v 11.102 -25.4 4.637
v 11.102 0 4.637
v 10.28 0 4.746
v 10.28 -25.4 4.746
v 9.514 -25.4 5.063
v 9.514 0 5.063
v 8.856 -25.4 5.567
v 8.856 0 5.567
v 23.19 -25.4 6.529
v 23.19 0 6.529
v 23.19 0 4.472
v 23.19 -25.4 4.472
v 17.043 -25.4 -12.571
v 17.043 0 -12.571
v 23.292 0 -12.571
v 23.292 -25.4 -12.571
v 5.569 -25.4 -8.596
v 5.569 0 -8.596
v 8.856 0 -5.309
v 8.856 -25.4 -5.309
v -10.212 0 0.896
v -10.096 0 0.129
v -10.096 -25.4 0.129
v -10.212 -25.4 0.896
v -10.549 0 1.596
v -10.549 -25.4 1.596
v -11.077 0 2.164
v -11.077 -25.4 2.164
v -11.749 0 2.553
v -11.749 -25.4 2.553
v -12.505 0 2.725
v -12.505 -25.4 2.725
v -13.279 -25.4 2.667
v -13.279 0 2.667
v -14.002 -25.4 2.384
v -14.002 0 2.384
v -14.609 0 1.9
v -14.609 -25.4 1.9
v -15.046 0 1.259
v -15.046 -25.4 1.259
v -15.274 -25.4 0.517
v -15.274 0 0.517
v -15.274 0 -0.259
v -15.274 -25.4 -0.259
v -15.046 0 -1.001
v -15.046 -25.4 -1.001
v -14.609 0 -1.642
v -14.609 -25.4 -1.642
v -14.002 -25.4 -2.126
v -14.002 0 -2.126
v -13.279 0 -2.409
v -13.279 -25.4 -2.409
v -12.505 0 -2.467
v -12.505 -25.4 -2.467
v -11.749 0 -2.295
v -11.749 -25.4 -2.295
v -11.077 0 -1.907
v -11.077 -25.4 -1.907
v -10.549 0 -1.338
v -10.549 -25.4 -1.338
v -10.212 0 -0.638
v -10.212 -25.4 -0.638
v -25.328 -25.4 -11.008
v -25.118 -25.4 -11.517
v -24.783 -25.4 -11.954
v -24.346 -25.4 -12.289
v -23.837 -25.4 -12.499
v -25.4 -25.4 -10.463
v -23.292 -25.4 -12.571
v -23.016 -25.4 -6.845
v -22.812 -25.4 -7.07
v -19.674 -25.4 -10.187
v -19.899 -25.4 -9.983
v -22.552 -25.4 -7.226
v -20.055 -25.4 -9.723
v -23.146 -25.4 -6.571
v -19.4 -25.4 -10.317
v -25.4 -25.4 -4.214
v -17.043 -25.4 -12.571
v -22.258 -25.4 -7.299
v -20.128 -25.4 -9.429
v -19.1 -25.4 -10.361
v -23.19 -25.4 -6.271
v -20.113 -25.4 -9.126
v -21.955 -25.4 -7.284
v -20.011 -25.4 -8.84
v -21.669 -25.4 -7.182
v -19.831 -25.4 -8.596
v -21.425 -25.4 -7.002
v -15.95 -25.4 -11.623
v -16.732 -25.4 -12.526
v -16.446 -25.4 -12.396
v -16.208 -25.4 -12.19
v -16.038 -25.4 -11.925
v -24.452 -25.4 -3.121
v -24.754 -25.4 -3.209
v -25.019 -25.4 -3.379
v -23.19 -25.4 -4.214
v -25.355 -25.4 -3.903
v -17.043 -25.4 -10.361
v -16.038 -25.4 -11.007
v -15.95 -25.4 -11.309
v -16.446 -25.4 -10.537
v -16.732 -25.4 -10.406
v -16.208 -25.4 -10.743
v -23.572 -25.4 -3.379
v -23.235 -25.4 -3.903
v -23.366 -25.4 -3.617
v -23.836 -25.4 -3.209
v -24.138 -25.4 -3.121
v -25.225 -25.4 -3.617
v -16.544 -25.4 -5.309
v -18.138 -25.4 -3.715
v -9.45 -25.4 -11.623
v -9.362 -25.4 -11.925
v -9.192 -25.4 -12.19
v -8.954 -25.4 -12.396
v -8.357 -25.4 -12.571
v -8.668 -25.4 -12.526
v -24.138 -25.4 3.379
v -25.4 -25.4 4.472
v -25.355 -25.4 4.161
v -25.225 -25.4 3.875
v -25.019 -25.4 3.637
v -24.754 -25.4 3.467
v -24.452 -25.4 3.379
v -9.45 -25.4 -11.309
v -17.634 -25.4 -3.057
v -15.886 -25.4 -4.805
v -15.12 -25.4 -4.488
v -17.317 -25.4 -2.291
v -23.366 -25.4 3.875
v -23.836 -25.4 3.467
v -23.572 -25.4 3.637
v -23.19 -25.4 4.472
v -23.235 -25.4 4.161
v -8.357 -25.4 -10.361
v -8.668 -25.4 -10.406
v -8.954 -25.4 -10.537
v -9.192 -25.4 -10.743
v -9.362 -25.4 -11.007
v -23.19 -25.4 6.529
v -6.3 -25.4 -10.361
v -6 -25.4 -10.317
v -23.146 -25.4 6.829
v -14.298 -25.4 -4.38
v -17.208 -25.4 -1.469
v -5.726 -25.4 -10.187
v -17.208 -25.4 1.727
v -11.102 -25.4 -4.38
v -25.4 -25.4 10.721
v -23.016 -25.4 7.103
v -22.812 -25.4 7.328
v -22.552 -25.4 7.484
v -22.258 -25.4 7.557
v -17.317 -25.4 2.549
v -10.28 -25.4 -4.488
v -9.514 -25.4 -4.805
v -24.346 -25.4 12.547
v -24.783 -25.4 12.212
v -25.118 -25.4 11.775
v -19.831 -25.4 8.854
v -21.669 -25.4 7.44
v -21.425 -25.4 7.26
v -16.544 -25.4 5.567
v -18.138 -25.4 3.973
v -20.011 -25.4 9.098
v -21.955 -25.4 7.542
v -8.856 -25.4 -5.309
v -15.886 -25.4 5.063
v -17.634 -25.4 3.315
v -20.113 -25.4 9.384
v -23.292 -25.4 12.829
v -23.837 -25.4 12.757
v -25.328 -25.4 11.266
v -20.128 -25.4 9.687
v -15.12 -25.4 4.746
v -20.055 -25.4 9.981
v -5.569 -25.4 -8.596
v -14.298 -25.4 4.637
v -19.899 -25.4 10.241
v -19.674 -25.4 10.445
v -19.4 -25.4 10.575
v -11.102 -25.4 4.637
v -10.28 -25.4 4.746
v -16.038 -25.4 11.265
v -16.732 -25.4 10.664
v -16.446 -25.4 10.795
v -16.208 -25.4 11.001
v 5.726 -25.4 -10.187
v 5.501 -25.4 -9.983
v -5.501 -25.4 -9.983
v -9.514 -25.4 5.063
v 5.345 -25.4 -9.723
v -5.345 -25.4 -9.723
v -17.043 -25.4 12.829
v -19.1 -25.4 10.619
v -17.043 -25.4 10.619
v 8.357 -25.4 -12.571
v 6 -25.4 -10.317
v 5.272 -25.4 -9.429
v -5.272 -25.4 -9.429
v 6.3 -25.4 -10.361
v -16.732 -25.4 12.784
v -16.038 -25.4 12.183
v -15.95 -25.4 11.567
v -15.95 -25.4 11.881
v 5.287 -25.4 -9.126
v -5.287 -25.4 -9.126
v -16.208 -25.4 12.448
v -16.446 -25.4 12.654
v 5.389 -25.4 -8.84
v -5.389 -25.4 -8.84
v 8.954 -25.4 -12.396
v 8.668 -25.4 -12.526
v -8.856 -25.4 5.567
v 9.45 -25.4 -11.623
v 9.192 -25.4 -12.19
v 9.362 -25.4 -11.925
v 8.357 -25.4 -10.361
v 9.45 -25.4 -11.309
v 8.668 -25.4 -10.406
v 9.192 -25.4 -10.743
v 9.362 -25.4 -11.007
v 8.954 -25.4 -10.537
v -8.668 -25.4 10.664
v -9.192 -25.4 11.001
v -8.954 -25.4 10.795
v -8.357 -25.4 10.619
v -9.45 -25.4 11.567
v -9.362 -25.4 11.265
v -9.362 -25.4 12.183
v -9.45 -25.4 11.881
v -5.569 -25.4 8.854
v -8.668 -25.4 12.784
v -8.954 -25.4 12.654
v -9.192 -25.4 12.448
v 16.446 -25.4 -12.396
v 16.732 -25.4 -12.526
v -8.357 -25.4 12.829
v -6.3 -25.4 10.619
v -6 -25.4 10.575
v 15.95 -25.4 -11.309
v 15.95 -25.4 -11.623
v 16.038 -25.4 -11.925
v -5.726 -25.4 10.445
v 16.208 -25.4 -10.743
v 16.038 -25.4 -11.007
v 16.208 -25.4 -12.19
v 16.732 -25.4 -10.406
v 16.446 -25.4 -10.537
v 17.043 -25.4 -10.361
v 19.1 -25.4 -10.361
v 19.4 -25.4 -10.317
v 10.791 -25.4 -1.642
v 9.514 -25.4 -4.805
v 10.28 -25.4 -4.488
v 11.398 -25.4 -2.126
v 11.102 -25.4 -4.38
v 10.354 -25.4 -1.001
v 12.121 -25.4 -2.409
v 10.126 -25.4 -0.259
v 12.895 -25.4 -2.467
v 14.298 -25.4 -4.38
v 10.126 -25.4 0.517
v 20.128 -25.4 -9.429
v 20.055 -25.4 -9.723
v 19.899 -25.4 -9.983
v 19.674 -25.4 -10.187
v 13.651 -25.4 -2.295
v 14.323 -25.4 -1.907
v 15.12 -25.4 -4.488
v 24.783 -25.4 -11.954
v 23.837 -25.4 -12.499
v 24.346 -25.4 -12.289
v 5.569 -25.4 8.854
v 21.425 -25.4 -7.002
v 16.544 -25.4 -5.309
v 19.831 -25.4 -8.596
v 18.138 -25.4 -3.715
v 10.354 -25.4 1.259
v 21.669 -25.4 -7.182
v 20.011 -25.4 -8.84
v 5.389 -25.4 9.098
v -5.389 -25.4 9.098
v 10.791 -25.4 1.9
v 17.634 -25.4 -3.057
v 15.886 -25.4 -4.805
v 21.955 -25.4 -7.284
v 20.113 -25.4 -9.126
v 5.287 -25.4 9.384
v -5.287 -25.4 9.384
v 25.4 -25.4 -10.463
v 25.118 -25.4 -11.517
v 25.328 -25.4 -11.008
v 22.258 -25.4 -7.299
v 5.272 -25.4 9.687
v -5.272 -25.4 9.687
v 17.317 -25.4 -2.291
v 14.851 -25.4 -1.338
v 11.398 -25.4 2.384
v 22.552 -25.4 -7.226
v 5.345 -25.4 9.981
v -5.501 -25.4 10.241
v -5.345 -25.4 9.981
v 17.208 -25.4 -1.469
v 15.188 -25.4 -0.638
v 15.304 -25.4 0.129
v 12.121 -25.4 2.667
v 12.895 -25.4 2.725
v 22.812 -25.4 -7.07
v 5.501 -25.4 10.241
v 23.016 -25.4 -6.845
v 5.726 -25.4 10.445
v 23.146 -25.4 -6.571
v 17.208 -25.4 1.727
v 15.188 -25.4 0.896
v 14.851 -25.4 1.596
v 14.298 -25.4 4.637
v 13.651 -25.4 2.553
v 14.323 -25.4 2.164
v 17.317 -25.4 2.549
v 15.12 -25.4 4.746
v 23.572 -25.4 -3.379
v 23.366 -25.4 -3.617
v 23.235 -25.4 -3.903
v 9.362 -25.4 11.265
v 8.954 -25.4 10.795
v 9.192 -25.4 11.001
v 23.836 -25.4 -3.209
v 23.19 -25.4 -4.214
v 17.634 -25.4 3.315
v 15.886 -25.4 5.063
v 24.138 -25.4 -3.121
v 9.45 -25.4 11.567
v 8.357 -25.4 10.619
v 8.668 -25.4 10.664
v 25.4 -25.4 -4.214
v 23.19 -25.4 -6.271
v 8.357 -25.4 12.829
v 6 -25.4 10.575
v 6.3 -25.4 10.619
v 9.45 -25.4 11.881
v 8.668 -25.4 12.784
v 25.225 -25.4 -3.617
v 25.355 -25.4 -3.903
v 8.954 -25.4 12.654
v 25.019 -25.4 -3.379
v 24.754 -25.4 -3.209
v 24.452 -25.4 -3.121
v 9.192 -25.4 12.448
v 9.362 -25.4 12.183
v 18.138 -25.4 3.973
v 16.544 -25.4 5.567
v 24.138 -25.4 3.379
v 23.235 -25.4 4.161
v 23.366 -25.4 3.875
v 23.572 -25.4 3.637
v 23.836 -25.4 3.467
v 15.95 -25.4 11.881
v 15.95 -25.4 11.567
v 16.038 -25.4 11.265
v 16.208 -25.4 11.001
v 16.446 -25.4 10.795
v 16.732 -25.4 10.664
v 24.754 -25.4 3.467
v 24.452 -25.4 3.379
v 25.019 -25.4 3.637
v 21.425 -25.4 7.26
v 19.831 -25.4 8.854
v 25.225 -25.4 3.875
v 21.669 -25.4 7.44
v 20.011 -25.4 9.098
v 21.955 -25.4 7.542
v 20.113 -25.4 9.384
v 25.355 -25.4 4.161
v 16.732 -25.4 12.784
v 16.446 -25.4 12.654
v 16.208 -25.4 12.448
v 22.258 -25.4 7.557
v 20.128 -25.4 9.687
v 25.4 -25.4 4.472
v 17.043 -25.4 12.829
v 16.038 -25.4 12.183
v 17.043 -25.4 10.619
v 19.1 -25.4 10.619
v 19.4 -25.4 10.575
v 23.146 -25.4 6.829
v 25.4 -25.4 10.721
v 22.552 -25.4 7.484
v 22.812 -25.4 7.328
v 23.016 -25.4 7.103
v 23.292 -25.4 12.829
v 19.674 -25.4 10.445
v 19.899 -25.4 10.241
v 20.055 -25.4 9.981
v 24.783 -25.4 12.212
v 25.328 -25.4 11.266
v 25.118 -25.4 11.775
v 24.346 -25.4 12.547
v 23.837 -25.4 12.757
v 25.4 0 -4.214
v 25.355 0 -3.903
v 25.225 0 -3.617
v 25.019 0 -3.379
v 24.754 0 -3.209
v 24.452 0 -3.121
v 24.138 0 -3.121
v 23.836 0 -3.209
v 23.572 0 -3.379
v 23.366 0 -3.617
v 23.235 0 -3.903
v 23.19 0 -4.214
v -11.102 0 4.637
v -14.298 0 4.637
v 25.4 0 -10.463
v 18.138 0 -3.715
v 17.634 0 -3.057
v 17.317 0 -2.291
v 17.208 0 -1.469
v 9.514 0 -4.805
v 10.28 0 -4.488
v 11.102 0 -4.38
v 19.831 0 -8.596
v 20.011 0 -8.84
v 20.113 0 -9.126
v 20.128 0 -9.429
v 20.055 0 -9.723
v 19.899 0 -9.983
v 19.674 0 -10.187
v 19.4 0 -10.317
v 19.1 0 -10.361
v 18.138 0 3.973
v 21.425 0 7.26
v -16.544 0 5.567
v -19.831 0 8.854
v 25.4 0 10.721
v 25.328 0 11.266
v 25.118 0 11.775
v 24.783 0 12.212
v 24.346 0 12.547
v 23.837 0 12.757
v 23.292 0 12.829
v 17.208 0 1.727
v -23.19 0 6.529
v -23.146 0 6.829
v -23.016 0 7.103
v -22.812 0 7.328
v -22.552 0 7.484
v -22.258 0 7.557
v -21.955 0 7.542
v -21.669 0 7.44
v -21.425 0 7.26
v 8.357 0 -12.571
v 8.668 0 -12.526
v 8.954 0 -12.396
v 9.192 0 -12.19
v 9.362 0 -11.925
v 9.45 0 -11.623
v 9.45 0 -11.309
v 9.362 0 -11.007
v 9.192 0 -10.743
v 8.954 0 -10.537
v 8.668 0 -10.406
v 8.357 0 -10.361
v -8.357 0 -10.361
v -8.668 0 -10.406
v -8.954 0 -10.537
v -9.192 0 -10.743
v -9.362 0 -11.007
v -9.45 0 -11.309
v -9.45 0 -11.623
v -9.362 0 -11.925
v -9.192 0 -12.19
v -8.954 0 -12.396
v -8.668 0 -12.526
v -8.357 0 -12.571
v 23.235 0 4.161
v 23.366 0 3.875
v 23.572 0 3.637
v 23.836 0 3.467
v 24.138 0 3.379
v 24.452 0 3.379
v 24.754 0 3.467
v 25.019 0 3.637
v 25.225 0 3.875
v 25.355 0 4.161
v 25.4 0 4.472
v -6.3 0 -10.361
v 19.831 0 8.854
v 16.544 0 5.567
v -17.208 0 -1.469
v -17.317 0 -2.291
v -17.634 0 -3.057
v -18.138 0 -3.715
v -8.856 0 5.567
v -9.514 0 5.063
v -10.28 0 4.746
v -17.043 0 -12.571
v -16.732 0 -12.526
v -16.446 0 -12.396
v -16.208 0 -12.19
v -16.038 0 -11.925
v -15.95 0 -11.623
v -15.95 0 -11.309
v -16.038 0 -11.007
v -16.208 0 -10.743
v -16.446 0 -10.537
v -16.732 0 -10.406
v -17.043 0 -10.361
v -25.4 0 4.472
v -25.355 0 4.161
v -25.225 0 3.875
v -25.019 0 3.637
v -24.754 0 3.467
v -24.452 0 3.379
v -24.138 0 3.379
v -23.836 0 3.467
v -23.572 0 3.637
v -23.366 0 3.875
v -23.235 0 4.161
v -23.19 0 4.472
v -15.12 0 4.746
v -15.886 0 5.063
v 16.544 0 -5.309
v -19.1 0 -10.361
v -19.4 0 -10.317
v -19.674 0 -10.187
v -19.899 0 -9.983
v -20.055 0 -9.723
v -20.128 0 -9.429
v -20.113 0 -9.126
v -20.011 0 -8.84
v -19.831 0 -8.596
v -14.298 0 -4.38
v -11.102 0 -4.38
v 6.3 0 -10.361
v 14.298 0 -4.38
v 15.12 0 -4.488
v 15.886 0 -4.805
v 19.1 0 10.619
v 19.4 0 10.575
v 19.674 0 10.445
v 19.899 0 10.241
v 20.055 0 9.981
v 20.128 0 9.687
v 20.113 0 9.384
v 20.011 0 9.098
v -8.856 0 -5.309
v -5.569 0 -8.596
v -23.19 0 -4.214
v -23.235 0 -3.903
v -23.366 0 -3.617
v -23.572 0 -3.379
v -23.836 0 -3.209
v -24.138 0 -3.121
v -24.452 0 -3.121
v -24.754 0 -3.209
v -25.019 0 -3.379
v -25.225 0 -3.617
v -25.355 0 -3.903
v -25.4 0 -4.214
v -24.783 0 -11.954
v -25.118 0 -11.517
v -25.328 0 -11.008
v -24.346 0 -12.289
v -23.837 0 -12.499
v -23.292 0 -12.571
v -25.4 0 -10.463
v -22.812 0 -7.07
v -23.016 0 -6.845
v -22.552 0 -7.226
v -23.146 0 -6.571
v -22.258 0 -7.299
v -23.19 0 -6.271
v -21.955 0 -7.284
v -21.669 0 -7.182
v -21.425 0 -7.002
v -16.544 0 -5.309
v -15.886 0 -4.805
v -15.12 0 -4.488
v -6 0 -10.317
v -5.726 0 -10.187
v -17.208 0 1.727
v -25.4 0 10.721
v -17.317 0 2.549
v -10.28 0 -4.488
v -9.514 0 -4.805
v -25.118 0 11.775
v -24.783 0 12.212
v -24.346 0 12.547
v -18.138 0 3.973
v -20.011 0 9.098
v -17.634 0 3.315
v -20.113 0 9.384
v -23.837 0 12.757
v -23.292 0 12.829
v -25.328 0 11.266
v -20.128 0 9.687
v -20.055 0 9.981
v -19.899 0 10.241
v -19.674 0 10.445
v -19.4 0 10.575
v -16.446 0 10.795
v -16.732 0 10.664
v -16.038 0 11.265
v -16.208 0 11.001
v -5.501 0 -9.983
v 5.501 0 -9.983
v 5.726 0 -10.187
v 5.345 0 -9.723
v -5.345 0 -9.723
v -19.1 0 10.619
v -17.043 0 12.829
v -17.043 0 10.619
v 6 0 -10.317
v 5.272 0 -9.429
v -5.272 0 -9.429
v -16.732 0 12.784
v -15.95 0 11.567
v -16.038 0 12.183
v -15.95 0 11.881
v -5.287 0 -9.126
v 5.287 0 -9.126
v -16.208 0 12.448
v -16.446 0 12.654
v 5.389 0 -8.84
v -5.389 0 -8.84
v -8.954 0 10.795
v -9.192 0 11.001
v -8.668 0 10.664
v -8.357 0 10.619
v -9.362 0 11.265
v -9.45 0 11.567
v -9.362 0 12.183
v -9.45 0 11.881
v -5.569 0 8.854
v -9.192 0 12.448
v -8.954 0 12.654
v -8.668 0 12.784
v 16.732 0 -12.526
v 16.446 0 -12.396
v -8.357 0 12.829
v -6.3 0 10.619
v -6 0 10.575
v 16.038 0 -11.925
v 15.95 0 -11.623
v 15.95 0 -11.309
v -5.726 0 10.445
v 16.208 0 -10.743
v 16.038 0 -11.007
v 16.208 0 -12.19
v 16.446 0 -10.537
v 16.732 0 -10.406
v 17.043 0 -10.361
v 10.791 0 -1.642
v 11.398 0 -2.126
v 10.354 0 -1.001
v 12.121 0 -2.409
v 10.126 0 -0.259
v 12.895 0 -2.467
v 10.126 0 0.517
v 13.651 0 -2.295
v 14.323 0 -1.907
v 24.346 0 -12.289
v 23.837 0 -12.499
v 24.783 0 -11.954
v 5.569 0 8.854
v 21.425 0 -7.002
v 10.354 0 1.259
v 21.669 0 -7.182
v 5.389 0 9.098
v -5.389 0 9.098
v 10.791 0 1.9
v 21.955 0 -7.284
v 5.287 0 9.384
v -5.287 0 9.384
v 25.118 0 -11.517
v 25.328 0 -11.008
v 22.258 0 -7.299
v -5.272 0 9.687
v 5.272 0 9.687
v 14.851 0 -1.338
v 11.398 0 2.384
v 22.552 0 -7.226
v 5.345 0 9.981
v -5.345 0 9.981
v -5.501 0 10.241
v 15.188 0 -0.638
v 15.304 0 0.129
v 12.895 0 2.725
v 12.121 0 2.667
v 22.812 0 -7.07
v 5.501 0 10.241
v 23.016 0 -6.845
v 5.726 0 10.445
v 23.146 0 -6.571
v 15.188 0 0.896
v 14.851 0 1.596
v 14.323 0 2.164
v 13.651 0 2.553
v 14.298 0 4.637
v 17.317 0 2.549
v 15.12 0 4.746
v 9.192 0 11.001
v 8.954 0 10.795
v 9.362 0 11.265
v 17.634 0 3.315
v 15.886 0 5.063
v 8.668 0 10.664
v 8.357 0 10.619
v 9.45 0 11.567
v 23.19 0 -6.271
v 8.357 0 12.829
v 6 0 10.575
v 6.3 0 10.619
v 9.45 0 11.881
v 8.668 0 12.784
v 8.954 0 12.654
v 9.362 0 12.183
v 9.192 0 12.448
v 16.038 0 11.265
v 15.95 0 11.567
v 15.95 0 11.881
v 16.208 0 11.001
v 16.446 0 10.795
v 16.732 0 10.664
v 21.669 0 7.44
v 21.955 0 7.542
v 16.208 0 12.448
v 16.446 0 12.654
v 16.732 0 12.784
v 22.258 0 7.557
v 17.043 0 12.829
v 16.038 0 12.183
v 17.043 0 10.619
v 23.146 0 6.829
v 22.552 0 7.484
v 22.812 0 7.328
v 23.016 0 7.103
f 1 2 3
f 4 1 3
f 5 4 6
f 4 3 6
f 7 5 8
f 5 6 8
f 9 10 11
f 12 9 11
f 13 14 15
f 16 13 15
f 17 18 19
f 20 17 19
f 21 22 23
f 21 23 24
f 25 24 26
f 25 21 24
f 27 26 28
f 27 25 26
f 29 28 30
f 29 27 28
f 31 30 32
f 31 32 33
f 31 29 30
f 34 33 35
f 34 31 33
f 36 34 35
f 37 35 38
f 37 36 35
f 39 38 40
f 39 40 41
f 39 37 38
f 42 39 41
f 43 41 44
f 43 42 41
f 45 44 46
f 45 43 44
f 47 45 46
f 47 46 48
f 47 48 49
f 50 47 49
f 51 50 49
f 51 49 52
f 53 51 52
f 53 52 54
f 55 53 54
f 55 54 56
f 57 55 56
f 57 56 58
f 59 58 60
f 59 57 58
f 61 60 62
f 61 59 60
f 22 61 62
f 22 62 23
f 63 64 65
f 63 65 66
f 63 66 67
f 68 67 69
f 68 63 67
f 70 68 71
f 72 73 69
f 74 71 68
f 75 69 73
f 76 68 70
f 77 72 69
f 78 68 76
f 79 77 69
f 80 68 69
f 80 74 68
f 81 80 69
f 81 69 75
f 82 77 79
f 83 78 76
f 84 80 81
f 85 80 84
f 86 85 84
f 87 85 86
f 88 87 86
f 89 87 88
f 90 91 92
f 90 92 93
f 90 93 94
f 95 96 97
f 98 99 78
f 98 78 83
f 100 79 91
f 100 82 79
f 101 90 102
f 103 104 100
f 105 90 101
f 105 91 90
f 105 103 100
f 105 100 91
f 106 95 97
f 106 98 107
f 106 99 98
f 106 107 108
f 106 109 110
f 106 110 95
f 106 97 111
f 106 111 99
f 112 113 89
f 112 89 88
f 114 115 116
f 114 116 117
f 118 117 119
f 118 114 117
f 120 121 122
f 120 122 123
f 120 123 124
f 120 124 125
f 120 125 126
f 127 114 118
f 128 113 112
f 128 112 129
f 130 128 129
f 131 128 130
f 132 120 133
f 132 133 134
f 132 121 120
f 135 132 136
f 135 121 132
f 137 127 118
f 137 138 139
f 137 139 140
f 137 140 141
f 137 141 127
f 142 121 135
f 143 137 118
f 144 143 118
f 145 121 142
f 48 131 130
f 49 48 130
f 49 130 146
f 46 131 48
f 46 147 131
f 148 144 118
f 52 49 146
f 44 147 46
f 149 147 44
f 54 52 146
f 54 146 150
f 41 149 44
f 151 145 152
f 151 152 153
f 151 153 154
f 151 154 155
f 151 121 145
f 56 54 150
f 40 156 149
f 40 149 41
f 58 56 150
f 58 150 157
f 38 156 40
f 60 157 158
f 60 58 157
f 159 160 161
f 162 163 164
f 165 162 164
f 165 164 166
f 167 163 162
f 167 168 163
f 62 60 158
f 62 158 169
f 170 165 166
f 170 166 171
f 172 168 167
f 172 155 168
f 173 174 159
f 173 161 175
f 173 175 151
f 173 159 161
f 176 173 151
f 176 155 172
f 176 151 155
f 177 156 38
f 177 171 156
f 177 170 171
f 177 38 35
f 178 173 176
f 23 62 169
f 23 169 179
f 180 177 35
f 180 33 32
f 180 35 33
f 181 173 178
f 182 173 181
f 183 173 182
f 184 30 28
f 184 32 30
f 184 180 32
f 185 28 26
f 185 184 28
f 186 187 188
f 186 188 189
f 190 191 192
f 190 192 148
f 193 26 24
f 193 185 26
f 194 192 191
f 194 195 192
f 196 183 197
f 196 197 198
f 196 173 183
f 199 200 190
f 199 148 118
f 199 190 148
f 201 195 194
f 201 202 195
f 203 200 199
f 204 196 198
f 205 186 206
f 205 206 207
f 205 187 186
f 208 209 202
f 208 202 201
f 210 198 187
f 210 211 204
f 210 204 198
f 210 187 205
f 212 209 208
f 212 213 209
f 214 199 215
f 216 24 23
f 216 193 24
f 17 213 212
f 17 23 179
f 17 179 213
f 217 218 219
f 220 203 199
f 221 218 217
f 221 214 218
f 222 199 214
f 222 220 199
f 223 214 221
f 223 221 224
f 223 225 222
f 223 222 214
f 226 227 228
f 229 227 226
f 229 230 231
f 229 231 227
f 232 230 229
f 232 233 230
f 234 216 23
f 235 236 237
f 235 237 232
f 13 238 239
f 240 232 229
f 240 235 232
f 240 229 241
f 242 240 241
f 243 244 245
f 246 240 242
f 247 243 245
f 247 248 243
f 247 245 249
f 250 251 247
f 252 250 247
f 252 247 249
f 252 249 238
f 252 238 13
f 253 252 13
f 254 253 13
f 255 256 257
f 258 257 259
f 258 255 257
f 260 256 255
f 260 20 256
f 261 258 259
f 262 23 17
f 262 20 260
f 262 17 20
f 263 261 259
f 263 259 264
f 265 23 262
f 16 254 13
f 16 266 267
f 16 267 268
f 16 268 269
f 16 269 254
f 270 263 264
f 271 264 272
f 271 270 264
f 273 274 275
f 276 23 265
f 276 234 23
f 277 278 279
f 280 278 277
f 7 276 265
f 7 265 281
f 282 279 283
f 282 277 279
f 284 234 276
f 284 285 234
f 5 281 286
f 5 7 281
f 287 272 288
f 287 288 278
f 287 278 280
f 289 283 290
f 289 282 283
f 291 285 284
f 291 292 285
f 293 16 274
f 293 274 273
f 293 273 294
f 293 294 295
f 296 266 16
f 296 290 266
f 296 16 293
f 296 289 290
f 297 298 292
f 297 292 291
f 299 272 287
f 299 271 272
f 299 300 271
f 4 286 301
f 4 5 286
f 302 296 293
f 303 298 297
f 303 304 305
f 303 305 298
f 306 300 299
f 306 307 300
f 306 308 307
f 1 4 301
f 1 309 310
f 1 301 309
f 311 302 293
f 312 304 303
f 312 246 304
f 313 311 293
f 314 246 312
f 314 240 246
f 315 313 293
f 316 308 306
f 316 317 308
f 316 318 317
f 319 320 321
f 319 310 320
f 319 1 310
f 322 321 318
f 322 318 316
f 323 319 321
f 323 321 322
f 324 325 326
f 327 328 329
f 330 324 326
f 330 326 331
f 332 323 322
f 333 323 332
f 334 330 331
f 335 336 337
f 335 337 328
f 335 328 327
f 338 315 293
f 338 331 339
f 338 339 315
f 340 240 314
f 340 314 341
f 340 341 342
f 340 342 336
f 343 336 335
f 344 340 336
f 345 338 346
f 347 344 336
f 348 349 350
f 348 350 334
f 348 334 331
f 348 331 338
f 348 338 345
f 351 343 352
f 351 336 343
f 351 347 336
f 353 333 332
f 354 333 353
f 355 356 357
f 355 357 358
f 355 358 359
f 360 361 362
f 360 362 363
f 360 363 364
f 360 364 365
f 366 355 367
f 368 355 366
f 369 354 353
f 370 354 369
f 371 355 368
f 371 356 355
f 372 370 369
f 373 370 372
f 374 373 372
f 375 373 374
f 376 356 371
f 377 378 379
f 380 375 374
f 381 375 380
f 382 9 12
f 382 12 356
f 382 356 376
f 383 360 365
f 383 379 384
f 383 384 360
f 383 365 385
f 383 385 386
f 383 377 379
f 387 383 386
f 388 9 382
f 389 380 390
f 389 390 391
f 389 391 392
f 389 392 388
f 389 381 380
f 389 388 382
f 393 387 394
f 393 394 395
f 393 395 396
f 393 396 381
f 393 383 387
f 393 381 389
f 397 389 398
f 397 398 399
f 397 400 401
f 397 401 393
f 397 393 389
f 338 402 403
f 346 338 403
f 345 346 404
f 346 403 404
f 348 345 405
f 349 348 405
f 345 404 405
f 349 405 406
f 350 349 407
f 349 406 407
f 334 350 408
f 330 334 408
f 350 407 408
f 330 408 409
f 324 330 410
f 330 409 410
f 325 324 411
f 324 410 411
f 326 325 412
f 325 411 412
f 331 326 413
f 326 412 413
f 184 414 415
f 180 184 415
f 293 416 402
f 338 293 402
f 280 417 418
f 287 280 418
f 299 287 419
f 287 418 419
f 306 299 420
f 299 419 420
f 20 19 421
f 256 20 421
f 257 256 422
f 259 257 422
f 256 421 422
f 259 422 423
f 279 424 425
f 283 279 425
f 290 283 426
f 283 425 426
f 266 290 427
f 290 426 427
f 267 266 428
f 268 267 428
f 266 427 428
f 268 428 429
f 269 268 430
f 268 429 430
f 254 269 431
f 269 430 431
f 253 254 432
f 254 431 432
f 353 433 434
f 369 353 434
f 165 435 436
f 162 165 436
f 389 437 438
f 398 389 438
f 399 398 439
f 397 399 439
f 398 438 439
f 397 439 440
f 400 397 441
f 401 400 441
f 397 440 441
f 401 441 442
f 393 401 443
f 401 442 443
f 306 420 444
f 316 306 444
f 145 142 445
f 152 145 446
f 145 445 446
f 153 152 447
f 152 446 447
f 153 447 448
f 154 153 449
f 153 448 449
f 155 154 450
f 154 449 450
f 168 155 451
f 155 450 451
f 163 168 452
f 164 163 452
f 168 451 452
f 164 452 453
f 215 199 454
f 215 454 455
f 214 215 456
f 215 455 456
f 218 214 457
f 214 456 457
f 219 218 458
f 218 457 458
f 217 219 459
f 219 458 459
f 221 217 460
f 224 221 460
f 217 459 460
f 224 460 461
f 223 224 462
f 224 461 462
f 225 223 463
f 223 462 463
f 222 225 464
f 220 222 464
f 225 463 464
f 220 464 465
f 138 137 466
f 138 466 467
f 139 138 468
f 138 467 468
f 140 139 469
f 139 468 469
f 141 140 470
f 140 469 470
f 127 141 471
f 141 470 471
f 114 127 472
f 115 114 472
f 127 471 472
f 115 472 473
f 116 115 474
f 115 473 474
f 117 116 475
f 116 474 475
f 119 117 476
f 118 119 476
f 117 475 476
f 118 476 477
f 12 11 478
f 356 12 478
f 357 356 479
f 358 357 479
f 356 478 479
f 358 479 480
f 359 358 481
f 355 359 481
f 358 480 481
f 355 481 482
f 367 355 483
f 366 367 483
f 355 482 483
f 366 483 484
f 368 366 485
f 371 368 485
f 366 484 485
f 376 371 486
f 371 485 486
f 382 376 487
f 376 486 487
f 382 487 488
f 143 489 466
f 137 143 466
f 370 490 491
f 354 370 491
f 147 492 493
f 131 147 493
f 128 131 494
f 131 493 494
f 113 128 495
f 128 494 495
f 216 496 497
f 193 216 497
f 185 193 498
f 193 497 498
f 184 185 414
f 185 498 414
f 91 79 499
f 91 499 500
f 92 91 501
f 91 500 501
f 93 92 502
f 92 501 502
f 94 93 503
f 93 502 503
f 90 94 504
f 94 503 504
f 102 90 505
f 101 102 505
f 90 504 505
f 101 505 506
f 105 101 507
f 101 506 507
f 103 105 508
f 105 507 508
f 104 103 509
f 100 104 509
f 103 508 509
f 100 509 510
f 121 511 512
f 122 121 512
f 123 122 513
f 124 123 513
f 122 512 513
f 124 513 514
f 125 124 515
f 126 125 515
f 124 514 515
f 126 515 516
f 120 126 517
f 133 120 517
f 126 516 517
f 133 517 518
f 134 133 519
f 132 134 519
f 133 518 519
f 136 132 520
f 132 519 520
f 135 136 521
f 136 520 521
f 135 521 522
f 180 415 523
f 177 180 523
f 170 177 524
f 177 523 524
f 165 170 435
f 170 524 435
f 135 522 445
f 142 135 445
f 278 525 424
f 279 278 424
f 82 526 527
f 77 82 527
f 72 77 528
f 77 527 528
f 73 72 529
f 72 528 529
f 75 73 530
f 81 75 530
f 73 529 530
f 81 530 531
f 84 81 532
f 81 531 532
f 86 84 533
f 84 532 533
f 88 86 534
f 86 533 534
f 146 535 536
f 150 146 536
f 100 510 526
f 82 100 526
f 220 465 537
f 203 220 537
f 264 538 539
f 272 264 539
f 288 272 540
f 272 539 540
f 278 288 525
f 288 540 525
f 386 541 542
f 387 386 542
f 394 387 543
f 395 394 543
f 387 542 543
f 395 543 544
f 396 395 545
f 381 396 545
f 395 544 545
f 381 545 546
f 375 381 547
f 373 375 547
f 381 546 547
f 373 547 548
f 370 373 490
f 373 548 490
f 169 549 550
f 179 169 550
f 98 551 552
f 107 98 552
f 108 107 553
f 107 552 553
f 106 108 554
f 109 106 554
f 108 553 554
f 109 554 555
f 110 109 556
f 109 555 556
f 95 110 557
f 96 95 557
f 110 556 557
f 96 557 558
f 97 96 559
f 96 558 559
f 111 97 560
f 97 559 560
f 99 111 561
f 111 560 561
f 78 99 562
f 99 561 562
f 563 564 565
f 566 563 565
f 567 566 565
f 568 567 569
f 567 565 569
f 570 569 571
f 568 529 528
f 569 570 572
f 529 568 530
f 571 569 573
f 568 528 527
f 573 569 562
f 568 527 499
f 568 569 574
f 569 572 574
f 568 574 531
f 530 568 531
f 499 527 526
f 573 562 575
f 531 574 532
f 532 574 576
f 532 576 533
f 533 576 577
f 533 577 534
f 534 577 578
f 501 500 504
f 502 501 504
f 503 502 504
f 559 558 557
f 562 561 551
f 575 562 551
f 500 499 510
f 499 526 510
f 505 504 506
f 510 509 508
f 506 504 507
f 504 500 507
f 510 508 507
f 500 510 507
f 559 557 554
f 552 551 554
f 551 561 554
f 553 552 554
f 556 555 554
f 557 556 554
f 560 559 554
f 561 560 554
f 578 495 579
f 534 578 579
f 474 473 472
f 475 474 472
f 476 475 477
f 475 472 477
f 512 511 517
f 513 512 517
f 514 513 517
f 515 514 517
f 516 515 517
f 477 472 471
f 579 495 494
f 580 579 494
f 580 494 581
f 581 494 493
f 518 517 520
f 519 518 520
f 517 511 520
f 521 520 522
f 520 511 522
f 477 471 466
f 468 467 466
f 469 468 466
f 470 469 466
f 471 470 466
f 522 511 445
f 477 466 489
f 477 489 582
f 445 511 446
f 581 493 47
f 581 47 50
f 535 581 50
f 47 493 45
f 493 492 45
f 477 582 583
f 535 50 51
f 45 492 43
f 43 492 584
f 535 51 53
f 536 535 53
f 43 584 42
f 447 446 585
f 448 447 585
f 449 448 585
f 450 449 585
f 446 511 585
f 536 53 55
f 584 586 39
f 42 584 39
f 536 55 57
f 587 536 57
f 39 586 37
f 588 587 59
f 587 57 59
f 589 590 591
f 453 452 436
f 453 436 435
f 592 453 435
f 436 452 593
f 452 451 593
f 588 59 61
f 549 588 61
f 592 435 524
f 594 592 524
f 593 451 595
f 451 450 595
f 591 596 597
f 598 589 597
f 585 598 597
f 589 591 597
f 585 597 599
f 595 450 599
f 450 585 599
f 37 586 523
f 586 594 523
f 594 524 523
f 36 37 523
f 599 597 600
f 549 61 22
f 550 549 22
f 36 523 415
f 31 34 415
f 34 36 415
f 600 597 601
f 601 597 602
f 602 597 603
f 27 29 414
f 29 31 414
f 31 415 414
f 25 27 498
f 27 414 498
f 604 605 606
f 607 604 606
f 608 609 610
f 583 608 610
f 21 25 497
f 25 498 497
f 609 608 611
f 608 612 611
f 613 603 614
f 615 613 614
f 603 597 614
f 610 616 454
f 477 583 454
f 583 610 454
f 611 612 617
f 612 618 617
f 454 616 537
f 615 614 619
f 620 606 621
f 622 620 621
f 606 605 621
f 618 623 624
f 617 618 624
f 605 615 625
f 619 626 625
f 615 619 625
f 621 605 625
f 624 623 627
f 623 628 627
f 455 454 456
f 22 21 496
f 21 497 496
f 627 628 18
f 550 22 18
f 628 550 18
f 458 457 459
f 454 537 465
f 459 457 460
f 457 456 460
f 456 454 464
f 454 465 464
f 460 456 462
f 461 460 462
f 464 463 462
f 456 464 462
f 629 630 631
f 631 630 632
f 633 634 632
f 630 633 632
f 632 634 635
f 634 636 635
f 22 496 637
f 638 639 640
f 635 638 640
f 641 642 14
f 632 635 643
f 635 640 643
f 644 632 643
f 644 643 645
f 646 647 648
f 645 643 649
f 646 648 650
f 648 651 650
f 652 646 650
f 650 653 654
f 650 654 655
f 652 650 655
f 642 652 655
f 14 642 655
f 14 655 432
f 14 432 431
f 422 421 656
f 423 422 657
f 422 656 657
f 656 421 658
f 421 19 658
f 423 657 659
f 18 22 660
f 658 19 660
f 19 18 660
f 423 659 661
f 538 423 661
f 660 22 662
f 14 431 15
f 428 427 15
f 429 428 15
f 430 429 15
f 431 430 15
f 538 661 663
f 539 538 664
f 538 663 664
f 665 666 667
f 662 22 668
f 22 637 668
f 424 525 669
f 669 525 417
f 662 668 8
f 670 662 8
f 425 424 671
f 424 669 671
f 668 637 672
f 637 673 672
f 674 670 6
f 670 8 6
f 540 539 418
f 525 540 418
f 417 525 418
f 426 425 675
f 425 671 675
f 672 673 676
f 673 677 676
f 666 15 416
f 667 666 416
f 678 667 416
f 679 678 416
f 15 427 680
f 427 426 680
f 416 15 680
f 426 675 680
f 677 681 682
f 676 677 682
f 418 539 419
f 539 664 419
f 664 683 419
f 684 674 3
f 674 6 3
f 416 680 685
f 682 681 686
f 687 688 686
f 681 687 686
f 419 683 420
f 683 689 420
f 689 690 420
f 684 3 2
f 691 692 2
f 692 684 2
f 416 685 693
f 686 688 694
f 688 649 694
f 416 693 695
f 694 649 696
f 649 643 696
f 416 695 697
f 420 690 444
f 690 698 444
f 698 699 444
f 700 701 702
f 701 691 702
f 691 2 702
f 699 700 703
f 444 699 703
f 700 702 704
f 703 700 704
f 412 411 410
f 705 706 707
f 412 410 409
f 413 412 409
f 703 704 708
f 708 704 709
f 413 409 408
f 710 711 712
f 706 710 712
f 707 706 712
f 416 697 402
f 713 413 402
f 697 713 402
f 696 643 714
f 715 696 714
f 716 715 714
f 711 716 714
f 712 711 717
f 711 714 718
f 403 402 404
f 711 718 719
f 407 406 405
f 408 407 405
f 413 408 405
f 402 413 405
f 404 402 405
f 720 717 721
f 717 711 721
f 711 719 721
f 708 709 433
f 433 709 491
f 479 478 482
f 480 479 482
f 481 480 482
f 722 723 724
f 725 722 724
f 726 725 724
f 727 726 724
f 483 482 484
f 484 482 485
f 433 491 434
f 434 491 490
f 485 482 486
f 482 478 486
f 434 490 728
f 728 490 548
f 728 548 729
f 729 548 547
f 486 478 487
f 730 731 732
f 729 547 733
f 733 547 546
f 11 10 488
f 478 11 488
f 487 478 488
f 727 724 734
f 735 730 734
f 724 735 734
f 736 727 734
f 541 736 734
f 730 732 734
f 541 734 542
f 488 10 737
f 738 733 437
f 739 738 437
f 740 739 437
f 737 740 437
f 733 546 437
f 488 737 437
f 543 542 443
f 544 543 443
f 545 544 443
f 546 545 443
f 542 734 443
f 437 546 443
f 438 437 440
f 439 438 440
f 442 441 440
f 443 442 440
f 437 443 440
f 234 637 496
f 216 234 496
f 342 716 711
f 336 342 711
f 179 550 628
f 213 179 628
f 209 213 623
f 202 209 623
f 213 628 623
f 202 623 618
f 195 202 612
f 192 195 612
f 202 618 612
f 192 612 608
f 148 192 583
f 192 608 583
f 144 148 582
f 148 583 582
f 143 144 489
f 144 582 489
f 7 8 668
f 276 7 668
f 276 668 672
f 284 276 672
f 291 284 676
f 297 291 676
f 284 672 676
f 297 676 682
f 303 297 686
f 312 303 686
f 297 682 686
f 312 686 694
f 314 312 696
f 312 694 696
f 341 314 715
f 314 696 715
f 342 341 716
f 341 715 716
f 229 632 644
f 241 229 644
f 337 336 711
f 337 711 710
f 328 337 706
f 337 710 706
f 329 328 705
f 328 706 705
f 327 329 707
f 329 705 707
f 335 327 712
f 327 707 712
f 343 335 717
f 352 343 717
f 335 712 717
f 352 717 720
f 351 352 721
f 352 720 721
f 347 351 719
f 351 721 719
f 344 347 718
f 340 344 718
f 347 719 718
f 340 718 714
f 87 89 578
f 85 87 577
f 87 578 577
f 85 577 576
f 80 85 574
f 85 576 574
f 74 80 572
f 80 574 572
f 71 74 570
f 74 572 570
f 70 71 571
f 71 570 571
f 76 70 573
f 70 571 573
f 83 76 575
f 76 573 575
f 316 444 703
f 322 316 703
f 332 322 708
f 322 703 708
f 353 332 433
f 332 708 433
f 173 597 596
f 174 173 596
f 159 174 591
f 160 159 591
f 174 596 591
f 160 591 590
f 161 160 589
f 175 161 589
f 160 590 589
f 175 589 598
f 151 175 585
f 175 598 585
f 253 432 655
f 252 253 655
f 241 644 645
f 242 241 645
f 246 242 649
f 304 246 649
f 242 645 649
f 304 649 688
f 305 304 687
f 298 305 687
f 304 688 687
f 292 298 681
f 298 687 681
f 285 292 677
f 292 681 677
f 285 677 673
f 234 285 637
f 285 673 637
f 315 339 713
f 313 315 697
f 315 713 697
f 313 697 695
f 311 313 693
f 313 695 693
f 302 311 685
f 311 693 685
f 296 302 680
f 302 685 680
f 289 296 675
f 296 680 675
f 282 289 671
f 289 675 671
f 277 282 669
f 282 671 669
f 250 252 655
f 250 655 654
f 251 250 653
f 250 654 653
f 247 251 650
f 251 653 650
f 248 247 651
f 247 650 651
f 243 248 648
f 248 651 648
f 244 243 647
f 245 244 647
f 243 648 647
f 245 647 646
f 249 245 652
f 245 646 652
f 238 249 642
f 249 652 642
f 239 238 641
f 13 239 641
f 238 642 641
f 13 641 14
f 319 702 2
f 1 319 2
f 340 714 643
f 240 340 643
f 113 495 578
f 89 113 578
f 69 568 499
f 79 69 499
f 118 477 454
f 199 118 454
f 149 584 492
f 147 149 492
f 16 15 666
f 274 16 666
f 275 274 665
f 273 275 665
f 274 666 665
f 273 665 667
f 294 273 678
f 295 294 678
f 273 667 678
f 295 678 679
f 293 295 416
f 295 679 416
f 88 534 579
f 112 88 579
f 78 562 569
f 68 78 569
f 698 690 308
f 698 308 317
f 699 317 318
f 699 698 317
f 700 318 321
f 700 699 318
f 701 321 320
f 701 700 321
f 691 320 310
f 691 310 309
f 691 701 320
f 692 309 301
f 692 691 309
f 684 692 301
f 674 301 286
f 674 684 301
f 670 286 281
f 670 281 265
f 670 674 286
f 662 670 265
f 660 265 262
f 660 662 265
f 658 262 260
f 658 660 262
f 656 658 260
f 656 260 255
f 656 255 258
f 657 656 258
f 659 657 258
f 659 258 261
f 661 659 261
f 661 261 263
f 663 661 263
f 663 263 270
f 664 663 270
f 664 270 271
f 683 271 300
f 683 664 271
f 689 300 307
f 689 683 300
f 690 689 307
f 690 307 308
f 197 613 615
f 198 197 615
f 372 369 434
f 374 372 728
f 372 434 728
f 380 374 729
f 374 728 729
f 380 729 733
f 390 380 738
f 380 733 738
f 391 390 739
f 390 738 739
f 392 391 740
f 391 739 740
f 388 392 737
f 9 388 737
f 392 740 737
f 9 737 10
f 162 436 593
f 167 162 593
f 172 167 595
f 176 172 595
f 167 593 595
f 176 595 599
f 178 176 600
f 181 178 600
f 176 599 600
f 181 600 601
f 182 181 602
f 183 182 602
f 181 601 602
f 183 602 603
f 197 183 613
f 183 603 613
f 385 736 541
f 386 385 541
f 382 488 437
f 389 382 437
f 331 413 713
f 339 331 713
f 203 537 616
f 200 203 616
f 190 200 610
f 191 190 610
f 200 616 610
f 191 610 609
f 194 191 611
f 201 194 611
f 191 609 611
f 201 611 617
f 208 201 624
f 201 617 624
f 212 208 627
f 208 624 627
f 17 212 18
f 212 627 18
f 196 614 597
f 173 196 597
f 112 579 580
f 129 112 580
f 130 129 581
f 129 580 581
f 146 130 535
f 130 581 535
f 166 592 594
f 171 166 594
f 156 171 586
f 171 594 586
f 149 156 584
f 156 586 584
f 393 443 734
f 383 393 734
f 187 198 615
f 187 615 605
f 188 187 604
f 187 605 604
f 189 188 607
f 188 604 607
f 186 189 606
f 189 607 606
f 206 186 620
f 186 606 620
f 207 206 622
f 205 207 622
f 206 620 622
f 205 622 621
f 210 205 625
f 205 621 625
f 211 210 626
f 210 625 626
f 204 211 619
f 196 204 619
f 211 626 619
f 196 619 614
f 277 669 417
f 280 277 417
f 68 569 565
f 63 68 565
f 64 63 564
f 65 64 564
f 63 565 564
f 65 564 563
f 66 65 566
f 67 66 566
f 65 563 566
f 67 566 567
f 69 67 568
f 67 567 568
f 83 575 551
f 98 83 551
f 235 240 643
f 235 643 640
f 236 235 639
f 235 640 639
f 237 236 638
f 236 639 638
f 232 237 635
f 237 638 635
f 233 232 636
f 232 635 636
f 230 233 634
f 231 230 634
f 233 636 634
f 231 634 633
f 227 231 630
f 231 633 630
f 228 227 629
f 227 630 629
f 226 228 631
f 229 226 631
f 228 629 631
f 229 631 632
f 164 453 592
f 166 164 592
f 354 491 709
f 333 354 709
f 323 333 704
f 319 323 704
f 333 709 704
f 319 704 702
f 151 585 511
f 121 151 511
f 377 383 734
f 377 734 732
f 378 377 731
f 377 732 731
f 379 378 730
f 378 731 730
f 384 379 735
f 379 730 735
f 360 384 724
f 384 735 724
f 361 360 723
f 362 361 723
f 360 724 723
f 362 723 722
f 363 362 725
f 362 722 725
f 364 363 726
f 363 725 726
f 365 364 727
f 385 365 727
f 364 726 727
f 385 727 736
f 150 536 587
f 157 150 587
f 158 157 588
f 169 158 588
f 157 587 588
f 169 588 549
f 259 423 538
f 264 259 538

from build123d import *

# Parameters (mm, degrees)
F0_R     = 2.6035
F1_DEPTH = 25.4


with BuildPart() as f1:
    # F0 (on Front) → F1 (new body)
    with BuildSketch(Plane.XZ):
        with BuildLine():
            Line((-17.0434, 12.828983), (-23.2918, 12.828983))
            ThreePointArc((-23.2918, 12.828983), (-24.782523, 12.211505), (-25.4, 10.720783))
            Line((-25.4, 10.720783), (-25.4, 4.472383))
            ThreePointArc((-25.4, 4.472383), (-24.2951, 3.367483), (-23.1902, 4.472383))
            Line((-23.1902, 4.472383), (-23.1902, 6.528513))
            ThreePointArc((-23.1902, 6.528513), (-22.55203, 7.483601), (-21.425427, 7.259505))
            Line((-21.425427, 7.259505), (-18.138436, 3.972514))
            ThreePointArc((-18.138436, 3.972514), (-17.450182, 2.94247), (-17.2085, 1.72745))
            Line((-17.2085, 1.72745), (-17.2085, -1.469485))
            ThreePointArc((-17.2085, -1.469485), (-17.450182, -2.684505), (-18.138436, -3.714549))
            Line((-18.138436, -3.714549), (-21.425427, -7.00154))
            ThreePointArc((-21.425427, -7.00154), (-22.55203, -7.225636), (-23.1902, -6.270547))
            Line((-23.1902, -6.270547), (-23.1902, -4.214417))
            ThreePointArc((-23.1902, -4.214417), (-24.2951, -3.109517), (-25.4, -4.214417))
            Line((-25.4, -4.214417), (-25.4, -10.462817))
            ThreePointArc((-25.4, -10.462817), (-24.782523, -11.95354), (-23.2918, -12.571017))
            Line((-23.2918, -12.571017), (-17.0434, -12.571017))
            ThreePointArc((-17.0434, -12.571017), (-15.9385, -11.466117), (-17.0434, -10.361217))
            Line((-17.0434, -10.361217), (-19.09953, -10.361217))
            ThreePointArc((-19.09953, -10.361217), (-20.054618, -9.723048), (-19.830523, -8.596445))
            Line((-19.830523, -8.596445), (-16.543532, -5.309453))
            ThreePointArc((-16.543532, -5.309453), (-15.513488, -4.6212), (-14.298468, -4.379517))
            Line((-14.298468, -4.379517), (-11.101532, -4.379517))
            ThreePointArc((-11.101532, -4.379517), (-9.886512, -4.6212), (-8.856468, -5.309453))
            Line((-8.856468, -5.309453), (-5.569477, -8.596445))
            ThreePointArc((-5.569477, -8.596445), (-5.345382, -9.723048), (-6.30047, -10.361217))
            Line((-6.30047, -10.361217), (-8.3566, -10.361217))
            ThreePointArc((-8.3566, -10.361217), (-9.4615, -11.466117), (-8.3566, -12.571017))
            Line((-8.3566, -12.571017), (2.1082, -12.571017))
            Line((2.1082, -12.571017), (8.3566, -12.571017))
            ThreePointArc((8.3566, -12.571017), (9.4615, -11.466117), (8.3566, -10.361217))
            Line((8.3566, -10.361217), (6.30047, -10.361217))
            ThreePointArc((6.30047, -10.361217), (5.345382, -9.723048), (5.569477, -8.596445))
            Line((5.569477, -8.596445), (8.856468, -5.309453))
            ThreePointArc((8.856468, -5.309453), (9.886512, -4.6212), (11.101532, -4.379517))
            Line((11.101532, -4.379517), (14.298468, -4.379517))
            ThreePointArc((14.298468, -4.379517), (15.513488, -4.6212), (16.543532, -5.309453))
            Line((16.543532, -5.309453), (19.830523, -8.596445))
            ThreePointArc((19.830523, -8.596445), (20.054618, -9.723048), (19.09953, -10.361217))
            Line((19.09953, -10.361217), (17.0434, -10.361217))
            ThreePointArc((17.0434, -10.361217), (15.9385, -11.466117), (17.0434, -12.571017))
            Line((17.0434, -12.571017), (23.2918, -12.571017))
            ThreePointArc((23.2918, -12.571017), (24.782523, -11.95354), (25.4, -10.462817))
            Line((25.4, -10.462817), (25.4, -4.214417))
            ThreePointArc((25.4, -4.214417), (24.2951, -3.109517), (23.1902, -4.214417))
            Line((23.1902, -4.214417), (23.1902, -6.270547))
            ThreePointArc((23.1902, -6.270547), (22.55203, -7.225636), (21.425427, -7.00154))
            Line((21.425427, -7.00154), (18.138436, -3.714549))
            ThreePointArc((18.138436, -3.714549), (17.450182, -2.684505), (17.2085, -1.469485))
            Line((17.2085, -1.469485), (17.2085, 1.72745))
            ThreePointArc((17.2085, 1.72745), (17.450182, 2.94247), (18.138436, 3.972514))
            Line((18.138436, 3.972514), (21.425427, 7.259505))
            ThreePointArc((21.425427, 7.259505), (22.55203, 7.483601), (23.1902, 6.528513))
            Line((23.1902, 6.528513), (23.1902, 4.472383))
            ThreePointArc((23.1902, 4.472383), (24.2951, 3.367483), (25.4, 4.472383))
            Line((25.4, 4.472383), (25.4, 10.720783))
            ThreePointArc((25.4, 10.720783), (24.782523, 12.211505), (23.2918, 12.828983))
            Line((23.2918, 12.828983), (17.0434, 12.828983))
            ThreePointArc((17.0434, 12.828983), (15.9385, 11.724083), (17.0434, 10.619183))
            Line((17.0434, 10.619183), (19.09953, 10.619183))
            ThreePointArc((19.09953, 10.619183), (20.054618, 9.981013), (19.830523, 8.85441))
            Line((19.830523, 8.85441), (16.543532, 5.567419))
            ThreePointArc((16.543532, 5.567419), (15.513488, 4.879165), (14.298468, 4.637483))
            Line((14.298468, 4.637483), (11.101532, 4.637483))
            ThreePointArc((11.101532, 4.637483), (9.886512, 4.879165), (8.856468, 5.567419))
            Line((8.856468, 5.567419), (5.569477, 8.85441))
            ThreePointArc((5.569477, 8.85441), (5.345382, 9.981013), (6.30047, 10.619183))
            Line((6.30047, 10.619183), (8.3566, 10.619183))
            ThreePointArc((8.3566, 10.619183), (9.4615, 11.724083), (8.3566, 12.828983))
            Line((8.3566, 12.828983), (2.1082, 12.828983))
            Line((2.1082, 12.828983), (-8.3566, 12.828983))
            ThreePointArc((-8.3566, 12.828983), (-9.4615, 11.724083), (-8.3566, 10.619183))
            Line((-8.3566, 10.619183), (-6.30047, 10.619183))
            ThreePointArc((-6.30047, 10.619183), (-5.345382, 9.981013), (-5.569477, 8.85441))
            Line((-5.569477, 8.85441), (-8.856468, 5.567419))
            ThreePointArc((-8.856468, 5.567419), (-9.886512, 4.879165), (-11.101532, 4.637483))
            Line((-11.101532, 4.637483), (-14.298468, 4.637483))
            ThreePointArc((-14.298468, 4.637483), (-15.513488, 4.879165), (-16.543532, 5.567419))
            Line((-16.543532, 5.567419), (-19.830523, 8.85441))
            ThreePointArc((-19.830523, 8.85441), (-20.054618, 9.981013), (-19.09953, 10.619183))
            Line((-19.09953, 10.619183), (-17.0434, 10.619183))
            ThreePointArc((-17.0434, 10.619183), (-15.9385, 11.724083), (-17.0434, 12.828983))
        make_face()
        with Locations((-12.7, 0.128983)):
            Circle(F0_R, mode=Mode.SUBTRACT)
        with Locations((12.7, 0.128983)):
            Circle(F0_R, mode=Mode.SUBTRACT)
    extrude(amount=F1_DEPTH)


solid = f1.part
